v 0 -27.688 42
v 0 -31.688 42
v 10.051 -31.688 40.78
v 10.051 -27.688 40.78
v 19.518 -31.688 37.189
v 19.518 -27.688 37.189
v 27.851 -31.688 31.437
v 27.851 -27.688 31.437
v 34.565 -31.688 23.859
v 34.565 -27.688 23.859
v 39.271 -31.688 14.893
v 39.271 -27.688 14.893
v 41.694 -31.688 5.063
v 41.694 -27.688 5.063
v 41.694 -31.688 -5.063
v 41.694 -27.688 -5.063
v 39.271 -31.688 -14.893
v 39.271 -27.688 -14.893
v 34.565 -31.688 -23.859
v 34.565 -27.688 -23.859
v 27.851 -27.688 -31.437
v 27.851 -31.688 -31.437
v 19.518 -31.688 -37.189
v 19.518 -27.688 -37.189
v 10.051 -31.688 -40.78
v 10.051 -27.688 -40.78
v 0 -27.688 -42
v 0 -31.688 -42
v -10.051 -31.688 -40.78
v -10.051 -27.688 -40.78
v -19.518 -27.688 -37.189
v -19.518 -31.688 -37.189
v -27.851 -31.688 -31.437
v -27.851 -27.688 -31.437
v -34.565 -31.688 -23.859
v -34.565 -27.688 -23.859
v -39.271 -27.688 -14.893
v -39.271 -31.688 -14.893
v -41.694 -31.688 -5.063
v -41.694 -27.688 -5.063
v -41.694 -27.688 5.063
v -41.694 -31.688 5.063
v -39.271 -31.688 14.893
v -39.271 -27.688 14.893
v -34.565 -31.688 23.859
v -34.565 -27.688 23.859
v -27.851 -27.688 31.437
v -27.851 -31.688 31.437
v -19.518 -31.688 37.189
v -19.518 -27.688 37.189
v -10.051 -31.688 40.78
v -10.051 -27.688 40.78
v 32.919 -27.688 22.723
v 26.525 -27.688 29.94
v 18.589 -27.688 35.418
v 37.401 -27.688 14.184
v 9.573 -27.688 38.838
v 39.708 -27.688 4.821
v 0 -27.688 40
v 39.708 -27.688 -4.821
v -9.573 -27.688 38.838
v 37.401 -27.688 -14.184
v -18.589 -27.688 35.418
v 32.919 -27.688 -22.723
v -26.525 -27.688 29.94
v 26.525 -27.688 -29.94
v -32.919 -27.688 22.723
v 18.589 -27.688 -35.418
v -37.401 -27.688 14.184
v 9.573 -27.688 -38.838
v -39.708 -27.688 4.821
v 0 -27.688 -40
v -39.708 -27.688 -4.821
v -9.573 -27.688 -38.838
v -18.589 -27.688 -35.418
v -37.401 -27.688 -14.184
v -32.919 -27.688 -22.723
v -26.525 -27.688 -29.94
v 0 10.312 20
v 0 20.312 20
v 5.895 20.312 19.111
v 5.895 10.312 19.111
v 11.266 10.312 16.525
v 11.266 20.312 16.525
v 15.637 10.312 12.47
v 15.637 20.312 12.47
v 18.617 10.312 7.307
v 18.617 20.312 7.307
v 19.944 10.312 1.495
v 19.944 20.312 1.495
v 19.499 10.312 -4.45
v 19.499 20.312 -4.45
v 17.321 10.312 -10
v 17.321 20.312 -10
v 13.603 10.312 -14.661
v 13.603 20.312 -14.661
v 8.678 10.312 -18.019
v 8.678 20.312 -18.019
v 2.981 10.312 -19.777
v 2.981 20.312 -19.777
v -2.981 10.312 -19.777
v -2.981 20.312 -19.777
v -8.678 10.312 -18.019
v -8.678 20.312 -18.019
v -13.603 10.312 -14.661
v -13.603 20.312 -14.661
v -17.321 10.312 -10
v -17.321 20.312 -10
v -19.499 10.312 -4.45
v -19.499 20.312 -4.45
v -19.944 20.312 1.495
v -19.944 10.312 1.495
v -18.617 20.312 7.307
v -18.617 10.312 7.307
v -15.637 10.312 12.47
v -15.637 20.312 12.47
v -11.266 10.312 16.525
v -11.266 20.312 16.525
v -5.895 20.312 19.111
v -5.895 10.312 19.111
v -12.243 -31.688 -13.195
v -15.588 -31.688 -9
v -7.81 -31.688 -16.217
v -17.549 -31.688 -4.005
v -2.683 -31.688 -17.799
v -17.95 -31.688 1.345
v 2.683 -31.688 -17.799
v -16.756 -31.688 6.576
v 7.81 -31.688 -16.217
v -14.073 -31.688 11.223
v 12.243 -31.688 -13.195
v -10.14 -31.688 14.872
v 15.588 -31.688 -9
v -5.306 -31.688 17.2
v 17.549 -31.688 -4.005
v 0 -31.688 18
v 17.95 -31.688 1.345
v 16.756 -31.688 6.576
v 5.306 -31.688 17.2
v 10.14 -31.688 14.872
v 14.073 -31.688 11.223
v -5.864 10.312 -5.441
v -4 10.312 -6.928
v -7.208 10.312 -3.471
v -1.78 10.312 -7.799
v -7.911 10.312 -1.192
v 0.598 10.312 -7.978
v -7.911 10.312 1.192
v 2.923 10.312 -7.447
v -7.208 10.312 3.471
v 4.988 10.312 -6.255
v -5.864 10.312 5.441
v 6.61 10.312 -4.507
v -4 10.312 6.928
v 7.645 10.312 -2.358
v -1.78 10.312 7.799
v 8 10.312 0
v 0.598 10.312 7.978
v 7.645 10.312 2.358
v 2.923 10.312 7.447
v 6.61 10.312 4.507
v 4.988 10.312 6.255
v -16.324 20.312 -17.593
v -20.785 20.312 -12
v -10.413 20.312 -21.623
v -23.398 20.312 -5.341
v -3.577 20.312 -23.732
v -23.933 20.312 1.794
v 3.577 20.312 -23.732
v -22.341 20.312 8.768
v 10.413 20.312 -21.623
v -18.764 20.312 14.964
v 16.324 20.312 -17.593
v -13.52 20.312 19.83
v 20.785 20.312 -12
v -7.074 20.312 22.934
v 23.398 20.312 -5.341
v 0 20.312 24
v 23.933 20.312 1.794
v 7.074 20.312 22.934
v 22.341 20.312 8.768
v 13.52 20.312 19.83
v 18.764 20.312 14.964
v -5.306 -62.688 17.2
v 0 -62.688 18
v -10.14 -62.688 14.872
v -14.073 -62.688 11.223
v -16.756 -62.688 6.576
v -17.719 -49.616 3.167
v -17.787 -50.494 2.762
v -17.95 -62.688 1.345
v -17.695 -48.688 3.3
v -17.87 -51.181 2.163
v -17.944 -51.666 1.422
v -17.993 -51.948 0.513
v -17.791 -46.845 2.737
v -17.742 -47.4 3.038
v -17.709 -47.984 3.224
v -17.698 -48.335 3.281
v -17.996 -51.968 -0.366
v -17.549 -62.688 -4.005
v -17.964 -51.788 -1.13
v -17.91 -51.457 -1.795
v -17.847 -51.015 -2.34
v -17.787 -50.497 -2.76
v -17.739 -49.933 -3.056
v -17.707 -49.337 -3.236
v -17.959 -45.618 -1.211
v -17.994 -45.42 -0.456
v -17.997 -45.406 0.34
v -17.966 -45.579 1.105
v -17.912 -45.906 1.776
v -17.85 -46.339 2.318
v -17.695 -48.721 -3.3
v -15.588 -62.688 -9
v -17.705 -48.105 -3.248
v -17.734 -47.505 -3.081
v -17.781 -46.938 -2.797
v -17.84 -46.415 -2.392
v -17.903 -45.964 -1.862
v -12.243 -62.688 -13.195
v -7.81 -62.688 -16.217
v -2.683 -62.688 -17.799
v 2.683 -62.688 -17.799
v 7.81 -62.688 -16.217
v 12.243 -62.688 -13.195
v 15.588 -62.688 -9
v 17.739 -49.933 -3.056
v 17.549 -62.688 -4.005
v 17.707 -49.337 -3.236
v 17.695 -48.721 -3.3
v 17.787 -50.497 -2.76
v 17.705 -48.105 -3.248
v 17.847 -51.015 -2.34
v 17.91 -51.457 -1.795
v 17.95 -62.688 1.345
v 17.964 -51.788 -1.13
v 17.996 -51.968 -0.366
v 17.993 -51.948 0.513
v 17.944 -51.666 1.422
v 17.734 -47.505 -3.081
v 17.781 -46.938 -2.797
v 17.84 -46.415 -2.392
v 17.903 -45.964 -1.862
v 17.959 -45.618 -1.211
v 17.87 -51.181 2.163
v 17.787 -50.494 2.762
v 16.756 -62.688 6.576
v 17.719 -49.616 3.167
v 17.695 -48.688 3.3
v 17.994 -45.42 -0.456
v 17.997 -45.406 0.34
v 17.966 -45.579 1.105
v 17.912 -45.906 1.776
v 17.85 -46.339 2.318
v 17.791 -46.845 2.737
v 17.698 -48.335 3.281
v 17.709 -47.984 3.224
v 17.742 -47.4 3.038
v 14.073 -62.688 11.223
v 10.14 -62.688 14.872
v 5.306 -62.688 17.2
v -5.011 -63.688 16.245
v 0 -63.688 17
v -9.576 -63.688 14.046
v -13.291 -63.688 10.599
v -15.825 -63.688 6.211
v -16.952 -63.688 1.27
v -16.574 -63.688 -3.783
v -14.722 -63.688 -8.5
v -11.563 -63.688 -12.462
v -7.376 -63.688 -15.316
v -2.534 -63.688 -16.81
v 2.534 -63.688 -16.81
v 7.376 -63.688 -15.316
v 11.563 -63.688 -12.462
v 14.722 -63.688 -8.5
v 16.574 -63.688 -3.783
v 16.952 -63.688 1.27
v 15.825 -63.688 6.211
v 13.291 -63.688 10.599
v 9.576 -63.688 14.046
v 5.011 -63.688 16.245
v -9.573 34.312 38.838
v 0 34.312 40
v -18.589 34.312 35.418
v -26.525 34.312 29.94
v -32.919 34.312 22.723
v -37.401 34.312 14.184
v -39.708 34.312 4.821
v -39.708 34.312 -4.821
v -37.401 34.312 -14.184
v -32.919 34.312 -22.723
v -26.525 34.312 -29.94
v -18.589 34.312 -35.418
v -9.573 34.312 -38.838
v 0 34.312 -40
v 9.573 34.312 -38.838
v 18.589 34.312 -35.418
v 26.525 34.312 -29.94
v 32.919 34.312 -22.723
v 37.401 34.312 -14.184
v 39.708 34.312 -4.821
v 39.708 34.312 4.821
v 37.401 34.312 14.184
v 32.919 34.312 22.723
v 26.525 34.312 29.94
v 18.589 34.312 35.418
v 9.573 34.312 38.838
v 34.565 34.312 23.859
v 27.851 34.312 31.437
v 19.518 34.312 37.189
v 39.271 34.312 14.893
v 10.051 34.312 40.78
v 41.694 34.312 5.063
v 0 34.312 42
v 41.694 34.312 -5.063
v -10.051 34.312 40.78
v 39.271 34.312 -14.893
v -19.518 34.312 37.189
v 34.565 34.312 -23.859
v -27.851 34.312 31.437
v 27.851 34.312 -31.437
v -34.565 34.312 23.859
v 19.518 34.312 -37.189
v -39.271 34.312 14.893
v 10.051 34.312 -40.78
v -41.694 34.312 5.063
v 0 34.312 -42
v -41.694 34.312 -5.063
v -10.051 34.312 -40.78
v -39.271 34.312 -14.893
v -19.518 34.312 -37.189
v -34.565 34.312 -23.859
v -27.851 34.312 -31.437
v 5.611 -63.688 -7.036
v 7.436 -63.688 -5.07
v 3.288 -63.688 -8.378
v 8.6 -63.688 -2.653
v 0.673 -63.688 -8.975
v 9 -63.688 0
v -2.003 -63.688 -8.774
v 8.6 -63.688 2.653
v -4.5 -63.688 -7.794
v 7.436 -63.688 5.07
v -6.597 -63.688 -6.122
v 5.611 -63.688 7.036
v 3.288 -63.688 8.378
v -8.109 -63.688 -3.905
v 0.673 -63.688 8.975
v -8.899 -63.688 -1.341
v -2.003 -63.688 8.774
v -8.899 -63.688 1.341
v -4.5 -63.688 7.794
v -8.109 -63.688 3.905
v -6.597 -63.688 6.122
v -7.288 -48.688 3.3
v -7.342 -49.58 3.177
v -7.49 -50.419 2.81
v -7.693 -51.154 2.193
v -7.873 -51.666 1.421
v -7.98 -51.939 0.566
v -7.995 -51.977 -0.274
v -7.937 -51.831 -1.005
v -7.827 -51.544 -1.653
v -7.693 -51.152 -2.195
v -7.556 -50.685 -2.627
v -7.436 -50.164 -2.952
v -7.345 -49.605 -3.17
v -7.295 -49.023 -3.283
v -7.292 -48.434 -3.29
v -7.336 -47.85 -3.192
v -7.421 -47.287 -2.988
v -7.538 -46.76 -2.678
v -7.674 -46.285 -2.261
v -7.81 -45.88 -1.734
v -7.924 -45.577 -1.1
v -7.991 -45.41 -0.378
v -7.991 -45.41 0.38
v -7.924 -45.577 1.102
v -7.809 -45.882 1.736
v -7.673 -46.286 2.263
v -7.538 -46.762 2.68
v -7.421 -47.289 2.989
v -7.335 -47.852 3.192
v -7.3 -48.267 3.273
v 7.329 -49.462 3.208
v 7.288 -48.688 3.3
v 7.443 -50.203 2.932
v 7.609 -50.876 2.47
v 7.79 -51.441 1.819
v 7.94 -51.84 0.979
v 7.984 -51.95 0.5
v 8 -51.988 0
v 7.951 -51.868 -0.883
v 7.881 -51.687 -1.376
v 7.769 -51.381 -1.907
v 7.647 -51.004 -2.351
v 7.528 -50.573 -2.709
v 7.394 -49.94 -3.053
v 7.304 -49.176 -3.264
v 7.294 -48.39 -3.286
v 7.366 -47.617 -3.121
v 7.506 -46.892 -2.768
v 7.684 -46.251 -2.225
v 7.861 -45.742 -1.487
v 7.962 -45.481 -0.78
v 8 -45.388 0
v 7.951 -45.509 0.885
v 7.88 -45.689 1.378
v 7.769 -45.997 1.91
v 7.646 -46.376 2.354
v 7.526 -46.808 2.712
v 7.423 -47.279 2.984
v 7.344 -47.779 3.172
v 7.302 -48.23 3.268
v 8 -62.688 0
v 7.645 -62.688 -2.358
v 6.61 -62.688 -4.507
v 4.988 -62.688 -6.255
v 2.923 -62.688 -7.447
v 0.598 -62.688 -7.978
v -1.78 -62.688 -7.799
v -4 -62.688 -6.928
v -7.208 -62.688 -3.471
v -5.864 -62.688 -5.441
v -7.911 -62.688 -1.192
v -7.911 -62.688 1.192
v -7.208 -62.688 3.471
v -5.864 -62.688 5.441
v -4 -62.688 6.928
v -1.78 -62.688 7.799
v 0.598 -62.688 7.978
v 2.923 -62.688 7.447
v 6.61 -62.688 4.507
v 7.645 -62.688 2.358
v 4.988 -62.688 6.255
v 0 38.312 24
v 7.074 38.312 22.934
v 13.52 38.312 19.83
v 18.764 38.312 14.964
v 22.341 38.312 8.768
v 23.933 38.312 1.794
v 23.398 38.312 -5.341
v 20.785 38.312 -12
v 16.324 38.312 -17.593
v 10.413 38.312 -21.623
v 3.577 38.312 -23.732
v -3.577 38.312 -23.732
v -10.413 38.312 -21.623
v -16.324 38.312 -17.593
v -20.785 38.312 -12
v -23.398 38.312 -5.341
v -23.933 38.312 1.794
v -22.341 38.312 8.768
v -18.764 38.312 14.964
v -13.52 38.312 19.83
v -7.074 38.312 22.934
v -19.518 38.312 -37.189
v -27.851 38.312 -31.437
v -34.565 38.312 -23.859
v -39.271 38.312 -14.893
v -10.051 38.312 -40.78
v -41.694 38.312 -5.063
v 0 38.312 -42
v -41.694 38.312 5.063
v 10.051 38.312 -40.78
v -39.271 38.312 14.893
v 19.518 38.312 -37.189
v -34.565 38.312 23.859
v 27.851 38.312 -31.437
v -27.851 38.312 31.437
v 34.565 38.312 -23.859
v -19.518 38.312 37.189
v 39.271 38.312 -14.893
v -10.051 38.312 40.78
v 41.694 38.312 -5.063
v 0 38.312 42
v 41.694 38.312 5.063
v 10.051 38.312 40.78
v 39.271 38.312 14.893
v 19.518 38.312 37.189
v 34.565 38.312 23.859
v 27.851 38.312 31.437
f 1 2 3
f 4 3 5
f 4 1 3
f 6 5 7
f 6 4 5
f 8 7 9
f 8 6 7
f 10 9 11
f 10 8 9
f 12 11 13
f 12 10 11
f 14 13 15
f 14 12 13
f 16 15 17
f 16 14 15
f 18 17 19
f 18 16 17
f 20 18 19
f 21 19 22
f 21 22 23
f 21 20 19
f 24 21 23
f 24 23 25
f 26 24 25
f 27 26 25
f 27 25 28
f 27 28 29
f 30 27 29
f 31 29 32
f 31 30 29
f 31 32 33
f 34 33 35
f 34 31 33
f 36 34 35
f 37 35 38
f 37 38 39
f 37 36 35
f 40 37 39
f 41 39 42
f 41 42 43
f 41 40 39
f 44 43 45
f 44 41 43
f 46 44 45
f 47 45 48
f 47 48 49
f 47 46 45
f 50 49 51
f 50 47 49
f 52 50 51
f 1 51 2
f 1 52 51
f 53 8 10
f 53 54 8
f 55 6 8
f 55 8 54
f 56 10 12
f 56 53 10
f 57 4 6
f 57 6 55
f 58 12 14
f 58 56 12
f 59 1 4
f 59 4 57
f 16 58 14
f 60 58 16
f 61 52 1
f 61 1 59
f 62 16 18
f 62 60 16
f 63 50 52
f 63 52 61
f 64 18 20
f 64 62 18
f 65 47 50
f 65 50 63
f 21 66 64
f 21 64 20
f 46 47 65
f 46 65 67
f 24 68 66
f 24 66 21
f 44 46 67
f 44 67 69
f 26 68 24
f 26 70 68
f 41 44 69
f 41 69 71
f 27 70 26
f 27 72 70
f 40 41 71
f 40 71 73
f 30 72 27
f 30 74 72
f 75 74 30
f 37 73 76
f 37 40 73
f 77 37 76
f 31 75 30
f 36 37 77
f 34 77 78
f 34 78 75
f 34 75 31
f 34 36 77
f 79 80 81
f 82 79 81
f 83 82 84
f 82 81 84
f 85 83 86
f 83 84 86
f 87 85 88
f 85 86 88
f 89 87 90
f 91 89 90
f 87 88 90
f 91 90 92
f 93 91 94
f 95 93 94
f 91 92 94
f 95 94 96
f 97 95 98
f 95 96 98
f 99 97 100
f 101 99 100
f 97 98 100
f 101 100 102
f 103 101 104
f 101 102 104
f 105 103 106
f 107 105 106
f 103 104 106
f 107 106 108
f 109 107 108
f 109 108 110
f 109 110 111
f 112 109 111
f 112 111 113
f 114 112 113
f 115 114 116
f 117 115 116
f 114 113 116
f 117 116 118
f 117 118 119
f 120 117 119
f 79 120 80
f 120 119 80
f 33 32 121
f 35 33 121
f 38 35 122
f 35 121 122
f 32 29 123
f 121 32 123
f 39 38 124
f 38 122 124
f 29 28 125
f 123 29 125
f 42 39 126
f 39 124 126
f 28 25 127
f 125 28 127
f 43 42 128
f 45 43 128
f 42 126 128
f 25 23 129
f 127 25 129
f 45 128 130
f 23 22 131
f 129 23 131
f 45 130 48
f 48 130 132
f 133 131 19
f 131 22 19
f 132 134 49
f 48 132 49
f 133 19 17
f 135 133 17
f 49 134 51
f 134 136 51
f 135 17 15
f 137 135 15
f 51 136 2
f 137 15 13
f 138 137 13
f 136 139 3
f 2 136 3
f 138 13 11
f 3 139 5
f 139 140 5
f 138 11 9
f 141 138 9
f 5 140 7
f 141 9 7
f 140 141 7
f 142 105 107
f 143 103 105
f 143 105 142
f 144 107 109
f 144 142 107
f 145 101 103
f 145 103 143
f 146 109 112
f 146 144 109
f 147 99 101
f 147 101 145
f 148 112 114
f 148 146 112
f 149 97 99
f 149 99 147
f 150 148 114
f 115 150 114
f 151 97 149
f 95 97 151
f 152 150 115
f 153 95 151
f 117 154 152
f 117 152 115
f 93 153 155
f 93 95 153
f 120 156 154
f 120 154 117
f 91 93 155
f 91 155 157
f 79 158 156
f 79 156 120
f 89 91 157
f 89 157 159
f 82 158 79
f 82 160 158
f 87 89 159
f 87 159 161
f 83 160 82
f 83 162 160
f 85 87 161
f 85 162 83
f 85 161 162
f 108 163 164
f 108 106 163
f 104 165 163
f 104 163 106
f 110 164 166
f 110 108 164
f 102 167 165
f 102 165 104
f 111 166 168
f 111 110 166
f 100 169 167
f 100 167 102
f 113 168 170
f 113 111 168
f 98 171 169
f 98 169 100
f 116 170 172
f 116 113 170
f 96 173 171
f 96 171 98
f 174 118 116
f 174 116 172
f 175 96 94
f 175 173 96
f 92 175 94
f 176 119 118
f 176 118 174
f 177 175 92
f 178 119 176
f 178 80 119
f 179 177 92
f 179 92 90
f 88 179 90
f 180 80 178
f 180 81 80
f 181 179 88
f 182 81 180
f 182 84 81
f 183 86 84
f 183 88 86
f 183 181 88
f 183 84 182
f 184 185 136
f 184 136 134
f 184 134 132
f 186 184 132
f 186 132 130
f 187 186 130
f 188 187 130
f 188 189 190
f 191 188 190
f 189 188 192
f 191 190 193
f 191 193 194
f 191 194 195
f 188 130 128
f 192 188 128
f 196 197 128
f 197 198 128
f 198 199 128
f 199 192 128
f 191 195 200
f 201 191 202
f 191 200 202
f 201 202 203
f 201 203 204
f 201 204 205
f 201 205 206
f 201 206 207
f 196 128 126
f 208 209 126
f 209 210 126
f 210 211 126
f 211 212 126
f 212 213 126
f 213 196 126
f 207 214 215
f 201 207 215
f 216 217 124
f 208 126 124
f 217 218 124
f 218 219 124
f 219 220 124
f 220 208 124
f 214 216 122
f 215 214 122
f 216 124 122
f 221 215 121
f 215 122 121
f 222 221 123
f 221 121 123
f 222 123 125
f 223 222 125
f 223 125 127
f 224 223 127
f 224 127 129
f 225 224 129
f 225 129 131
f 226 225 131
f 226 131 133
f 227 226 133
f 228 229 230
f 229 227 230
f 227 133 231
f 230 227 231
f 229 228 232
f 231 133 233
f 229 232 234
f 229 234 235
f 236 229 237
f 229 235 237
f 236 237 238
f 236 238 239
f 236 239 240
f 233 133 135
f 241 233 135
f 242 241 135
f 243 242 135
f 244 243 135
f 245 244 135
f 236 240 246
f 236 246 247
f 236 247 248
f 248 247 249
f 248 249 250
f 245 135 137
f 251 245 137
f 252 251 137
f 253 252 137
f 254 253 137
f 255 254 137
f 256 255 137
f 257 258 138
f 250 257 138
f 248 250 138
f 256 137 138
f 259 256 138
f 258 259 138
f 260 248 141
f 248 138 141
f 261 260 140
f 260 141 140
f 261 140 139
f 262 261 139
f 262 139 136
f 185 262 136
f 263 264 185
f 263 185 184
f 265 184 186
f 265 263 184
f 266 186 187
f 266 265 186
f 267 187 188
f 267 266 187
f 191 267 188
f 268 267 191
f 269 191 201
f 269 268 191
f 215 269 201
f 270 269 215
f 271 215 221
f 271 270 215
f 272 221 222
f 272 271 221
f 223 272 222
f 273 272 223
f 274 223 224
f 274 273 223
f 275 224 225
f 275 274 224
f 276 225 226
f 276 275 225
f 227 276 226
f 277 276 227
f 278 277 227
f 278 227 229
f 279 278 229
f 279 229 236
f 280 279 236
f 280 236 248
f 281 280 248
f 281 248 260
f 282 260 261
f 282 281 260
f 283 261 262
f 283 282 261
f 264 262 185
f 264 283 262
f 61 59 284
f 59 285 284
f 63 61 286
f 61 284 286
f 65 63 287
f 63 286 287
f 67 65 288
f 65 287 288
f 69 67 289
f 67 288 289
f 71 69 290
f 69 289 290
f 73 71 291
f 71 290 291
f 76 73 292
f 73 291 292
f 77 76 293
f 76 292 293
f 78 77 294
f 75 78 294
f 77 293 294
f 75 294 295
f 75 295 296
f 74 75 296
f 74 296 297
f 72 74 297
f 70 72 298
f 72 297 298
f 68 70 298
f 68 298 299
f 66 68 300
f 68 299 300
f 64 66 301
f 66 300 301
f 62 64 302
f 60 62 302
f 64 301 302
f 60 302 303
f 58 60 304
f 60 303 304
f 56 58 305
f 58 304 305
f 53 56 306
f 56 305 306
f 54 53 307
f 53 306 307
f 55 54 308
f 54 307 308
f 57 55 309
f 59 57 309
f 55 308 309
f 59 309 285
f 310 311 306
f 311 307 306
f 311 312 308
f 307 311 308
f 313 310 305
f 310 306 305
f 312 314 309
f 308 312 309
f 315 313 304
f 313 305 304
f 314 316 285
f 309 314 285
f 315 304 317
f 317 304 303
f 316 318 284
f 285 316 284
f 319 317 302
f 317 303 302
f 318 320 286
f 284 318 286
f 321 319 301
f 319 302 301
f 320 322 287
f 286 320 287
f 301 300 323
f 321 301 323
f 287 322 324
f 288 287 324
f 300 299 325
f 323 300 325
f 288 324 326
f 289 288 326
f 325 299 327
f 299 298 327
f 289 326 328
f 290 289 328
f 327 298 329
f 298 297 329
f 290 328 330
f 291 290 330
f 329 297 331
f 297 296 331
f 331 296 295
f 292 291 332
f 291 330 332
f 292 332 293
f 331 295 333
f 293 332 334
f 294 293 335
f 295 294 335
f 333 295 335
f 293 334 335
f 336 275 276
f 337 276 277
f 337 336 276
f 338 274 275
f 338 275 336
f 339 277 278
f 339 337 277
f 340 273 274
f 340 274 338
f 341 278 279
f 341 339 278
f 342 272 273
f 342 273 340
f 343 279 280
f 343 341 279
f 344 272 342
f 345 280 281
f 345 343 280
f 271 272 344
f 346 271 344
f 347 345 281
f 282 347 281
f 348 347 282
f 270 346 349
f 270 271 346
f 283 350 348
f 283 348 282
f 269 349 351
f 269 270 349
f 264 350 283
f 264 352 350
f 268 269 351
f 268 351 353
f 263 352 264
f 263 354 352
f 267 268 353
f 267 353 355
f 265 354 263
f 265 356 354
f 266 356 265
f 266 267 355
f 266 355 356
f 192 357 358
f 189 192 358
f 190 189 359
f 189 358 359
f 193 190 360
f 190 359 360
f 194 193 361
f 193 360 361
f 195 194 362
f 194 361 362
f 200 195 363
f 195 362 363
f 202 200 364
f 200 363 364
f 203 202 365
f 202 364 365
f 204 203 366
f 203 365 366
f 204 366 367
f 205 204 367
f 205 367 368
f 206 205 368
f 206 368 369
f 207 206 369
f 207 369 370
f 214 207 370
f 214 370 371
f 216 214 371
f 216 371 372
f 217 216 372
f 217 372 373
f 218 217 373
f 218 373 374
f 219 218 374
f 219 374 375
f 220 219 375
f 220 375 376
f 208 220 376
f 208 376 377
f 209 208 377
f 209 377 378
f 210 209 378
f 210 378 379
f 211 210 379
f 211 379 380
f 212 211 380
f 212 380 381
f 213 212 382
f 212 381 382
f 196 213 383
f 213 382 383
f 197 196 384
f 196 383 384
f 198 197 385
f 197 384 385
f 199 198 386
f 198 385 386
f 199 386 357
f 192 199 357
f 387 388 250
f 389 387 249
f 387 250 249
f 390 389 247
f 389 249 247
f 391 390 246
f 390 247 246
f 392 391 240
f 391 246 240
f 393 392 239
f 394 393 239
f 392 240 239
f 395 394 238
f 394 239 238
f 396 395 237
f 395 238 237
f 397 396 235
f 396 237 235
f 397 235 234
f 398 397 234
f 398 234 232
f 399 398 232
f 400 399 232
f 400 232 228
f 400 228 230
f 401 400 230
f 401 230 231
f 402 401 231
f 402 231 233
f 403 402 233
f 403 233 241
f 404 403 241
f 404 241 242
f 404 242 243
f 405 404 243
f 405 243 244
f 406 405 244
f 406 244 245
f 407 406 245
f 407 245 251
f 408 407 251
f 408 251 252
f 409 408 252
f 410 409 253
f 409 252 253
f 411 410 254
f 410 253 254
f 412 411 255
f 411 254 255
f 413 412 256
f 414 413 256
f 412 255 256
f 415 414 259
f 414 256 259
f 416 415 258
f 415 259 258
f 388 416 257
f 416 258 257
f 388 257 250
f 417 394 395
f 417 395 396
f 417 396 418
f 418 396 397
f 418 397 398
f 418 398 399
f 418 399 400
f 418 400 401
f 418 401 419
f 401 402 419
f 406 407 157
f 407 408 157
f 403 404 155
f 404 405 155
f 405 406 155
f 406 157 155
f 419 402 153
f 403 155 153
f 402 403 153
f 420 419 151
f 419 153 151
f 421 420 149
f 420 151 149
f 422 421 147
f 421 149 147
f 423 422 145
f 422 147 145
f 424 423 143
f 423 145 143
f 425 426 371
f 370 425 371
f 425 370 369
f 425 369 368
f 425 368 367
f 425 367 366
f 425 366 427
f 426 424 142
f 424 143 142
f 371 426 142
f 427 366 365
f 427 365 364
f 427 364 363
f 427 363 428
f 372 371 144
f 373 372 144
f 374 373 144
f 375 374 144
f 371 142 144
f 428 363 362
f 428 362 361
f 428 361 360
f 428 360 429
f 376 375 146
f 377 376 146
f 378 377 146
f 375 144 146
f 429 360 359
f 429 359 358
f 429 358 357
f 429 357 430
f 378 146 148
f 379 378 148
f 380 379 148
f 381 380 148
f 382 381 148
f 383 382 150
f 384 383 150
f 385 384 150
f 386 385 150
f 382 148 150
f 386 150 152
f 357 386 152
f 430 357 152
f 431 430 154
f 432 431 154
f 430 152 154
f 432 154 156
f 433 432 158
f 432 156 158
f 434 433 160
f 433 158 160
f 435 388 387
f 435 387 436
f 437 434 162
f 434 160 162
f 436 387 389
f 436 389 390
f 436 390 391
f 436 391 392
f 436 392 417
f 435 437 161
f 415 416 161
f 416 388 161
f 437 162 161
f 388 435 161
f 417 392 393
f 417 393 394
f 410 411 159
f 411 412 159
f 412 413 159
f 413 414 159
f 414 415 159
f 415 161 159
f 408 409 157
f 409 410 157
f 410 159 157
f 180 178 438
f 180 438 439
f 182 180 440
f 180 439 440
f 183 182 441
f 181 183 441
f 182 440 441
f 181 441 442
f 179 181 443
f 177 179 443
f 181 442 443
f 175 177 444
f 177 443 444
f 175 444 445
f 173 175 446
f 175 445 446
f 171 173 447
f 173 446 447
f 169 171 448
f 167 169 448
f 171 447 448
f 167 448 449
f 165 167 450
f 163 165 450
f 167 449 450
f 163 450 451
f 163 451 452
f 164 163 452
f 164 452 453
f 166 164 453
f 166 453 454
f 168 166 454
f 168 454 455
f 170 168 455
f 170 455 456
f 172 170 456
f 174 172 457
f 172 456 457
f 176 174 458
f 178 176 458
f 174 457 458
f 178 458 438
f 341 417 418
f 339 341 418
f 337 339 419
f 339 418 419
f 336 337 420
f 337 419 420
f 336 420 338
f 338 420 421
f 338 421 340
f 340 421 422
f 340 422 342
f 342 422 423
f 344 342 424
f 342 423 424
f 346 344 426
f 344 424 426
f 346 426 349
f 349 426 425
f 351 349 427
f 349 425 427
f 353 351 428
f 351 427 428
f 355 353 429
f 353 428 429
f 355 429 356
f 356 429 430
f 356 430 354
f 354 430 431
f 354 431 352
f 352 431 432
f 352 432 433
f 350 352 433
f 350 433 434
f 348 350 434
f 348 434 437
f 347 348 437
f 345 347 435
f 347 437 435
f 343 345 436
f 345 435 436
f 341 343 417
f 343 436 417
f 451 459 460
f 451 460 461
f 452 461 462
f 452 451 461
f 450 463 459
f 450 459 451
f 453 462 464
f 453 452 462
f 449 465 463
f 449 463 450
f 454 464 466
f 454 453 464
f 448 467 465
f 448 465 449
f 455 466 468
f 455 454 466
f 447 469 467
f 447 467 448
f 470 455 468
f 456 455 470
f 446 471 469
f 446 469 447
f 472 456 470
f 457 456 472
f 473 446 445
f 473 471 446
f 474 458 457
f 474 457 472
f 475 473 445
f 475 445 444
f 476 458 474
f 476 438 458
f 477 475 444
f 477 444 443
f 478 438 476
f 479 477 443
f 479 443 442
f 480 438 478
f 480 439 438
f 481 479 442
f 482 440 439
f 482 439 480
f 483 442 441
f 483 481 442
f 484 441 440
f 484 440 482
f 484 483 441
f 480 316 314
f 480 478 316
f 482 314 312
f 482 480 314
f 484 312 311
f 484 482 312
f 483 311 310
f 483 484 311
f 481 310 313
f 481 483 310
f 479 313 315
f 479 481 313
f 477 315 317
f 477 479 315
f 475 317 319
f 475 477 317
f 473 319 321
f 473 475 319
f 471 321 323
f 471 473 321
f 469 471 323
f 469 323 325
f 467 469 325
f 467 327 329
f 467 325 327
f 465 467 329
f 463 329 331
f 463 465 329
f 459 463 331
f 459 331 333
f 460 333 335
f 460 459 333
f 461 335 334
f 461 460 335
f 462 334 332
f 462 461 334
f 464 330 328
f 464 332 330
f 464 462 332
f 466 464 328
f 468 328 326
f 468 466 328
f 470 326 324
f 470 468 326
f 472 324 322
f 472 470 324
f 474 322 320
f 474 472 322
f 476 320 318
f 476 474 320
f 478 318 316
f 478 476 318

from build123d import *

# Parameters (mm, degrees)
SKETCH_1_R            = 21
EXTRUDE_1_DEPTH       = 17.5
SKETCH_2_W            = 1
SKETCH_2_H            = 31
SKETCH_3_R            = 12
CUT_EXTRUDE_1_DEPTH   = 9
SKETCH_4_R            = 9
EXTRUDE_2_DEPTH       = 16
HOLE_WIZARD_M4_2_D    = 3.3
HOLE_WIZARD_8_0_8_1_D = 8
CHAMFER_2_SIZE        = 0.5
SKETCH_15_R           = 10
CUT_EXTRUDE_3_DEPTH   = 5
SCALE1_SCALE          = 2


with BuildPart() as part:
    # 草图1 → 凸台-拉伸1 (new, symmetric)
    with BuildSketch(Plane(origin=(0, 0, 0), x_dir=(1, 0, 0), z_dir=(0, 1, 0))):
        with Locations(Location((0, 0, 0), (0, 0, 270))):
            Circle(SKETCH_1_R)
    extrude(amount=EXTRUDE_1_DEPTH, both=True)

    # 草图2 → 切除-旋转1 (revolve, cut)
    with BuildSketch(Plane.XY, mode=Mode.PRIVATE) as cut_revolve_1_sk:
        with Locations((20.5, 0)):
            Rectangle(SKETCH_2_W, SKETCH_2_H)
    revolve(cut_revolve_1_sk.sketch.rotate(Axis((0, 17.5, 0), (0, -1, 0)), 90), axis=Axis((0, 17.5, 0), (0, -1, 0)), mode=Mode.SUBTRACT)

    # 草图3 → 切除-拉伸1 (cut)
    with BuildSketch(Plane(origin=(0, 17.5, 0), x_dir=(1, 0, 0), z_dir=(0, 1, 0))):
        with Locations(Location((0, 0, 0), (0, 0, 270))):
            Circle(SKETCH_3_R)
    extrude(amount=-CUT_EXTRUDE_1_DEPTH, mode=Mode.SUBTRACT)

    # 草图4 → 凸台-拉伸2 (add)
    with BuildSketch(Plane.XZ.offset(17.5)):
        with Locations(Location((0, 0, 0), (0, 0, 90))):
            Circle(SKETCH_4_R)
    extrude(amount=EXTRUDE_2_DEPTH)

    # M4 螺纹孔2 (through all)
    with Locations(Plane(origin=(-43.616669336, 0, 0), x_dir=(0, 0, -1), z_dir=(-1, 0, 0))):
        with Locations((0, 26)):
            Hole(HOLE_WIZARD_M4_2_D / 2)

    # Ø8.0 (8) 直径孔1 (through all)
    with Locations(Plane(origin=(0, -33.5, 0), x_dir=(-1, 0, 0), z_dir=(0, -1, 0))):
        with Locations((0, 0)):
            Hole(HOLE_WIZARD_8_0_8_1_D / 2)

    # 倒角2
    chamfer_2_edges = [part.edges().sort_by_distance(p)[0] for p in [
        (0, -33.5, -9),
        (-4, -33.5, 0),
    ]]
    chamfer(chamfer_2_edges, length=CHAMFER_2_SIZE)

    # 草图15 → 切除-拉伸3 (cut)
    with BuildSketch(Plane(origin=(0, 8.5, 0), x_dir=(1, 0, 0), z_dir=(0, 1, 0))):
        with Locations(Location((0, 0, 0), (0, 0, 270))):
            Circle(SKETCH_15_R)
    extrude(amount=-CUT_EXTRUDE_3_DEPTH, mode=Mode.SUBTRACT)


with BuildPart() as part_1:
    # Scale1: scaled about (-1.22e-07, -3.311996838, 3.643e-06)
    add(part.part.scale(SCALE1_SCALE).moved(Location((1.22e-07, 3.311996838, -3.643e-06))))


solid = part_1.part
